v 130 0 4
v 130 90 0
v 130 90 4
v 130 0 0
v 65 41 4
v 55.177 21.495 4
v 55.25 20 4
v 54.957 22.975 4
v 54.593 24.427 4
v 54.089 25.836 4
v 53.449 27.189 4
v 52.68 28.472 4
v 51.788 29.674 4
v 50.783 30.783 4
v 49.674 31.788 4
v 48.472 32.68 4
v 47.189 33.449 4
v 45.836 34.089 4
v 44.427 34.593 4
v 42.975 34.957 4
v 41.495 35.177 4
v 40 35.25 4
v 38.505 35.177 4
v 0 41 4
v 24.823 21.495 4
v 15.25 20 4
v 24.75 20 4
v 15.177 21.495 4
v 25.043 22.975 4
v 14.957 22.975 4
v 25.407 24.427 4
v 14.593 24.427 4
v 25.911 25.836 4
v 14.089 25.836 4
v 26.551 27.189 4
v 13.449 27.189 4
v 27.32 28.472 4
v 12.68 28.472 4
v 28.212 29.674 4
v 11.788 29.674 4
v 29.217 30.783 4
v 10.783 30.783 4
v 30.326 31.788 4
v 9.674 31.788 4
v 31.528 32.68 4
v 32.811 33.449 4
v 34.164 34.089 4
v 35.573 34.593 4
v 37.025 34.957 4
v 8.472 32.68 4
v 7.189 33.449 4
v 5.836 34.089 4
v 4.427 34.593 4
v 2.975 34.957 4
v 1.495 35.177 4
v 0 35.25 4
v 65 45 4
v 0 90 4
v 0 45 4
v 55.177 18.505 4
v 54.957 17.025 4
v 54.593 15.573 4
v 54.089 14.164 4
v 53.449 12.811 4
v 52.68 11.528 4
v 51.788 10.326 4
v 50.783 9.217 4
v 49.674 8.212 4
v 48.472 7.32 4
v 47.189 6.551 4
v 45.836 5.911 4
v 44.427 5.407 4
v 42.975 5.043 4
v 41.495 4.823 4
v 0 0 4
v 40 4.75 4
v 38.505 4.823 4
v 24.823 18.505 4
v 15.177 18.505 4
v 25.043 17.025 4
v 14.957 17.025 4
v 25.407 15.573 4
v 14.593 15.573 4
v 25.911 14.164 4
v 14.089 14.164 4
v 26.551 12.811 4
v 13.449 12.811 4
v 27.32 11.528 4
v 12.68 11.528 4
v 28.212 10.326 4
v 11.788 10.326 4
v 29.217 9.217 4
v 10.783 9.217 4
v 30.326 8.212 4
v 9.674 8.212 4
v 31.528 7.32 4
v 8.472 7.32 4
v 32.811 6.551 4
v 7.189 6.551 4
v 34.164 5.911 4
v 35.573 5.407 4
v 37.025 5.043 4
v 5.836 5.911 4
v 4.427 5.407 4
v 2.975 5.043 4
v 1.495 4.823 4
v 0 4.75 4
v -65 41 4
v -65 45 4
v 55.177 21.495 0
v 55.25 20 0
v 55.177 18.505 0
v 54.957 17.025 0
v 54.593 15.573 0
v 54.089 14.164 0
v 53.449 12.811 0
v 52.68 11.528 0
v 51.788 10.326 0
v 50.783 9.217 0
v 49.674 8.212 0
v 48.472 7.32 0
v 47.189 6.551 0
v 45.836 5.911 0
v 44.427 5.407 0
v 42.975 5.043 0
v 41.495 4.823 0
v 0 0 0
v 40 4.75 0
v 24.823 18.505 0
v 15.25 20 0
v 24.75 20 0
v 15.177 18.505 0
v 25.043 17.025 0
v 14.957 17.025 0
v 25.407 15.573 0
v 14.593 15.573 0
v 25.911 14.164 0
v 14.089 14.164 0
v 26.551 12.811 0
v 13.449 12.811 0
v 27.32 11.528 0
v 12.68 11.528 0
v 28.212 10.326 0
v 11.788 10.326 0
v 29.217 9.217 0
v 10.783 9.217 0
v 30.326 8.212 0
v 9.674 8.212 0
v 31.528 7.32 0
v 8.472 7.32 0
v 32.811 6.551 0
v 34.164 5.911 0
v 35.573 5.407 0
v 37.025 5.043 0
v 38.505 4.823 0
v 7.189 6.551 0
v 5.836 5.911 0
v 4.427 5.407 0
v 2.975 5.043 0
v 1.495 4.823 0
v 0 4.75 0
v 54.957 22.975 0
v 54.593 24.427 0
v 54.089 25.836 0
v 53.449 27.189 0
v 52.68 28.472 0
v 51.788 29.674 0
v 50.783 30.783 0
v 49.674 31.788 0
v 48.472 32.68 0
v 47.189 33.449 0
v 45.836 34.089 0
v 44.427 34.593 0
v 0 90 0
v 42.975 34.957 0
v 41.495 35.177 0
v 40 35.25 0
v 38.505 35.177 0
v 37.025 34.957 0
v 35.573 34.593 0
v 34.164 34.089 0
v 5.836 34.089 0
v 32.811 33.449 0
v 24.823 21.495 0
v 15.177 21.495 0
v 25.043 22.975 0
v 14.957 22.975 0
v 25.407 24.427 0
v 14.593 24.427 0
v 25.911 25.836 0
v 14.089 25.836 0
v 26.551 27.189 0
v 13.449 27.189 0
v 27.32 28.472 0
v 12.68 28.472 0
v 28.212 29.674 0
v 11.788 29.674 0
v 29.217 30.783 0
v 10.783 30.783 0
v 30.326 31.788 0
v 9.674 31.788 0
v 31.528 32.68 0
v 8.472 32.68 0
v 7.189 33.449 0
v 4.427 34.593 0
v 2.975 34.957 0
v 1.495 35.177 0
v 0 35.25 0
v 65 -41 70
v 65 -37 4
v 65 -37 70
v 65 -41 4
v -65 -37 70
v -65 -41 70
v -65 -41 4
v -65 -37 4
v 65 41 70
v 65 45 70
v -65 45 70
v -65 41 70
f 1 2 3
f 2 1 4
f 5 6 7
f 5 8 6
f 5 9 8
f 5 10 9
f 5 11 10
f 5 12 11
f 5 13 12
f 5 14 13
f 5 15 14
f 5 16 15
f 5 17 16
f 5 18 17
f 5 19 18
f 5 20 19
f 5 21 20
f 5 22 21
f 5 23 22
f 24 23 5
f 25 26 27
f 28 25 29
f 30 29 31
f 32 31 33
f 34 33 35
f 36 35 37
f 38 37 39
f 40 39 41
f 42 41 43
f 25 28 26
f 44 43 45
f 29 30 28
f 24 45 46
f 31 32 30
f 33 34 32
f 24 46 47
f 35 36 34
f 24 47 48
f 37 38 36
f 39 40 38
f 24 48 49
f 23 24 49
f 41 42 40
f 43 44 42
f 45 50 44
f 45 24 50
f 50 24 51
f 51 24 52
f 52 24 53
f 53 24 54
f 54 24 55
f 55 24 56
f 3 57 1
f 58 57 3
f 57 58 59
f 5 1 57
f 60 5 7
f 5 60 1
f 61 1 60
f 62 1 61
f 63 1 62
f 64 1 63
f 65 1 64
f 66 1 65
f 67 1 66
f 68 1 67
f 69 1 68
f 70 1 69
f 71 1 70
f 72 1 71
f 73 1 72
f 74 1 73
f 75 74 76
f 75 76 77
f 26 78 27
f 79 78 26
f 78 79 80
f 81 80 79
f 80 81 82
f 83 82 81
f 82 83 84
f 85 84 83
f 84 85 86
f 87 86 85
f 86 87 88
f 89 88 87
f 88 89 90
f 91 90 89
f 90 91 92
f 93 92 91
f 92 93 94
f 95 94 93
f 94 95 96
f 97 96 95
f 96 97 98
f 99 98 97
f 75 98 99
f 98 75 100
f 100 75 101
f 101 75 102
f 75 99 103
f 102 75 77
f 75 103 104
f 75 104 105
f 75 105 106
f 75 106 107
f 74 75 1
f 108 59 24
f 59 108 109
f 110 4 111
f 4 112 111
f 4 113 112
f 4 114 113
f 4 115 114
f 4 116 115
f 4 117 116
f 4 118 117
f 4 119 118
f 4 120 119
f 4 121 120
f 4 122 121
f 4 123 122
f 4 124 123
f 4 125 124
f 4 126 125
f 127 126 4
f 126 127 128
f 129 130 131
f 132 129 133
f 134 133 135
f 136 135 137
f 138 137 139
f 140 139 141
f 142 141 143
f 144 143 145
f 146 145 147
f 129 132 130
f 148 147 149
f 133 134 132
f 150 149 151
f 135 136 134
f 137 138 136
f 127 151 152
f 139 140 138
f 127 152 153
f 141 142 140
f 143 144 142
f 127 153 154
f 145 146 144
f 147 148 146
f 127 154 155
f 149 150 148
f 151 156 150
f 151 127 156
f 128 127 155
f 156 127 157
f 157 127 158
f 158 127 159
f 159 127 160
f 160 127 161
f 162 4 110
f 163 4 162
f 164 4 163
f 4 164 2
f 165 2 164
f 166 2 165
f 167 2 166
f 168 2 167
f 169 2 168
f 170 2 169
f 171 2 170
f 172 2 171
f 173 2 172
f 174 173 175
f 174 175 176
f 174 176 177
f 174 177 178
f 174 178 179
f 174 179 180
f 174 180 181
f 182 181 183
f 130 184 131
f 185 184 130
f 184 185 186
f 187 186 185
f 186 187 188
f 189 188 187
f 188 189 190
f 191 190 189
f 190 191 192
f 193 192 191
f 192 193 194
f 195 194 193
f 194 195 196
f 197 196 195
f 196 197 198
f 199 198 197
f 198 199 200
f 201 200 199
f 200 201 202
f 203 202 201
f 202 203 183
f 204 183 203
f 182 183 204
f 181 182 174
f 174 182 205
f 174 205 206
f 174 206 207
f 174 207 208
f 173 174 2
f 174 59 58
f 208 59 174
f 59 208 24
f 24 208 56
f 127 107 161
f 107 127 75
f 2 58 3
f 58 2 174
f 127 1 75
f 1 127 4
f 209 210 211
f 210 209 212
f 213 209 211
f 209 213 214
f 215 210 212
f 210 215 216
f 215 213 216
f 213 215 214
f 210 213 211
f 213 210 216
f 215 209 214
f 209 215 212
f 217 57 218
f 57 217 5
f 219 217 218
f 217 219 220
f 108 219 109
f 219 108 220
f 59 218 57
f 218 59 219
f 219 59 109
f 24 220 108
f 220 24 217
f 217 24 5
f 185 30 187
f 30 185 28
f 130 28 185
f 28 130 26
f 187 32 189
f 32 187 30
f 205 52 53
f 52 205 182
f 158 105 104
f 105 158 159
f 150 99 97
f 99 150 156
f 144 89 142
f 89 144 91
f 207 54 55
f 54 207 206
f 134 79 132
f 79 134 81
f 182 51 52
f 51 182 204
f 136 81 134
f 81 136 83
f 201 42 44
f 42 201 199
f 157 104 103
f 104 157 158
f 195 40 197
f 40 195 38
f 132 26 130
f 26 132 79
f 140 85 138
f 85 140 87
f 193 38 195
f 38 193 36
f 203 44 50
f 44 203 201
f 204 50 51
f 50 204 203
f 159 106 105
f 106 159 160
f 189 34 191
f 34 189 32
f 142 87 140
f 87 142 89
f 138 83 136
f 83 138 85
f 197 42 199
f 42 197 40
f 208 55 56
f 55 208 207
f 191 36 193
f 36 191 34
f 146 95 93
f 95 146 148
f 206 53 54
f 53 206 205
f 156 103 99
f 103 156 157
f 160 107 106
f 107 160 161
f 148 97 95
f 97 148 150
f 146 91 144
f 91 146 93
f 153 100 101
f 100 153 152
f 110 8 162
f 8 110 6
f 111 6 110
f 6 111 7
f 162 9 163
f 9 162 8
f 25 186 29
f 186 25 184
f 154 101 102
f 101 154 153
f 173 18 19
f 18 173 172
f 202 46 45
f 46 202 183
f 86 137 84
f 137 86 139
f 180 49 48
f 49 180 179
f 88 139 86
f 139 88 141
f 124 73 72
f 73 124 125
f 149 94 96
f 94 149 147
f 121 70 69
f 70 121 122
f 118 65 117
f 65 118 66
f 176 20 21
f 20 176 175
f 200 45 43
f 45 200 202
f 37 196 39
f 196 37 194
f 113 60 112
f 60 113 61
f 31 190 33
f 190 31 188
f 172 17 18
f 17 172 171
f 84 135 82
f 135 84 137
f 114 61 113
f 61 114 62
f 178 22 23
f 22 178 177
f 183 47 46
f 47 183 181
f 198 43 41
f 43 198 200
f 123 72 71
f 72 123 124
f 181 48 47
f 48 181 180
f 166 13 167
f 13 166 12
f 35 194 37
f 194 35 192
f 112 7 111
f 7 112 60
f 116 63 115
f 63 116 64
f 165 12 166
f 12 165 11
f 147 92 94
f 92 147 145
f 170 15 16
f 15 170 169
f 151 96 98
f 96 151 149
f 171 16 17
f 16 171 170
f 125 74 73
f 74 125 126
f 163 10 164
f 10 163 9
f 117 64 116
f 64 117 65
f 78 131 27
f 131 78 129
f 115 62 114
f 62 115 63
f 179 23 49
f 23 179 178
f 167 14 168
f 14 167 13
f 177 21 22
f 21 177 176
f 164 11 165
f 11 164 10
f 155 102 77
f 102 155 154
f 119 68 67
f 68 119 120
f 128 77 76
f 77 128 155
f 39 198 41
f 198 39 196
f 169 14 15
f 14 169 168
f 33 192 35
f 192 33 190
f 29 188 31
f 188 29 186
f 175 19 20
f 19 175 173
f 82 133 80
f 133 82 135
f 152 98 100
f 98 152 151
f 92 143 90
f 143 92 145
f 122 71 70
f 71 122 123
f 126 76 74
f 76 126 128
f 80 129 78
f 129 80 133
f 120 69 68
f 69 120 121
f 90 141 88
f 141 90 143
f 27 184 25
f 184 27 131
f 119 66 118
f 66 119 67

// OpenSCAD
// Variables
    plate_width_x = 130;
    plate_width_y = 90;
    plate_thickness = 4;
    hole_diameter = 30.5;
    hole_spacing_x = 40;
    hole_spacing_y = 40;
    wall_length = 130;
    wall_thickness = 4;
    wall_height_total = 70;
    wall_start_z = plate_thickness;
    wall_height = wall_height_total - wall_start_z;

    $fn = 64;

    // Calculate positions
    // Plate centered at 0,0
    // X range: -65 to 65
    // Y range: -45 to 45

    // Hole centers
    // X: -40, 0, 40
    // Y: -20, 20

    // Wall positions
    // Y: -45 to -41 and 41 to 45
    // X: -65 to 65
    // Z: 4 to 70

    difference() {
        union() {
            // Base Plate
            cube([plate_width_x, plate_width_y, plate_thickness], center = false);
            // Wait, cube center=false means origin at corner.
            // I need to center the plate on origin.
            // translate([-plate_width_x/2, -plate_width_y/2, 0]) cube([plate_width_x, plate_width_y, plate_thickness]);

            // Walls
            // Wall 1 (Bottom Edge)
            translate([-wall_length/2, -plate_width_y/2 + wall_thickness, wall_start_z])
                cube([wall_length, wall_thickness, wall_height]);
            // Wall 2 (Top Edge)
            translate([-wall_length/2, plate_width_y/2 - wall_thickness, wall_start_z])
                cube([wall_length, wall_thickness, wall_height]);
        }

        // Holes
        // Loop X
        for (i = [-1, 0, 1]) {
            // Loop Y
            for (j = [-1, 1]) {
                // Calculate center
                cx = i * hole_spacing_x;
                cy = j * hole_spacing_y / 2; // Wait, spacing is 40.
                // If j = -1, cy = -20. If j = 1, cy = 20.
                // hole_spacing_y is 40.
                // So cy = j * (hole_spacing_y / 2);
                // Wait, loop j = [-1, 1].
                // j=-1 -> -20. j=1 -> 20. Correct.

                translate([cx, cy, -0.05])
                    cylinder(h = plate_thickness + 0.1, d = hole_diameter, $fn = 64);
            }
        }
    }
